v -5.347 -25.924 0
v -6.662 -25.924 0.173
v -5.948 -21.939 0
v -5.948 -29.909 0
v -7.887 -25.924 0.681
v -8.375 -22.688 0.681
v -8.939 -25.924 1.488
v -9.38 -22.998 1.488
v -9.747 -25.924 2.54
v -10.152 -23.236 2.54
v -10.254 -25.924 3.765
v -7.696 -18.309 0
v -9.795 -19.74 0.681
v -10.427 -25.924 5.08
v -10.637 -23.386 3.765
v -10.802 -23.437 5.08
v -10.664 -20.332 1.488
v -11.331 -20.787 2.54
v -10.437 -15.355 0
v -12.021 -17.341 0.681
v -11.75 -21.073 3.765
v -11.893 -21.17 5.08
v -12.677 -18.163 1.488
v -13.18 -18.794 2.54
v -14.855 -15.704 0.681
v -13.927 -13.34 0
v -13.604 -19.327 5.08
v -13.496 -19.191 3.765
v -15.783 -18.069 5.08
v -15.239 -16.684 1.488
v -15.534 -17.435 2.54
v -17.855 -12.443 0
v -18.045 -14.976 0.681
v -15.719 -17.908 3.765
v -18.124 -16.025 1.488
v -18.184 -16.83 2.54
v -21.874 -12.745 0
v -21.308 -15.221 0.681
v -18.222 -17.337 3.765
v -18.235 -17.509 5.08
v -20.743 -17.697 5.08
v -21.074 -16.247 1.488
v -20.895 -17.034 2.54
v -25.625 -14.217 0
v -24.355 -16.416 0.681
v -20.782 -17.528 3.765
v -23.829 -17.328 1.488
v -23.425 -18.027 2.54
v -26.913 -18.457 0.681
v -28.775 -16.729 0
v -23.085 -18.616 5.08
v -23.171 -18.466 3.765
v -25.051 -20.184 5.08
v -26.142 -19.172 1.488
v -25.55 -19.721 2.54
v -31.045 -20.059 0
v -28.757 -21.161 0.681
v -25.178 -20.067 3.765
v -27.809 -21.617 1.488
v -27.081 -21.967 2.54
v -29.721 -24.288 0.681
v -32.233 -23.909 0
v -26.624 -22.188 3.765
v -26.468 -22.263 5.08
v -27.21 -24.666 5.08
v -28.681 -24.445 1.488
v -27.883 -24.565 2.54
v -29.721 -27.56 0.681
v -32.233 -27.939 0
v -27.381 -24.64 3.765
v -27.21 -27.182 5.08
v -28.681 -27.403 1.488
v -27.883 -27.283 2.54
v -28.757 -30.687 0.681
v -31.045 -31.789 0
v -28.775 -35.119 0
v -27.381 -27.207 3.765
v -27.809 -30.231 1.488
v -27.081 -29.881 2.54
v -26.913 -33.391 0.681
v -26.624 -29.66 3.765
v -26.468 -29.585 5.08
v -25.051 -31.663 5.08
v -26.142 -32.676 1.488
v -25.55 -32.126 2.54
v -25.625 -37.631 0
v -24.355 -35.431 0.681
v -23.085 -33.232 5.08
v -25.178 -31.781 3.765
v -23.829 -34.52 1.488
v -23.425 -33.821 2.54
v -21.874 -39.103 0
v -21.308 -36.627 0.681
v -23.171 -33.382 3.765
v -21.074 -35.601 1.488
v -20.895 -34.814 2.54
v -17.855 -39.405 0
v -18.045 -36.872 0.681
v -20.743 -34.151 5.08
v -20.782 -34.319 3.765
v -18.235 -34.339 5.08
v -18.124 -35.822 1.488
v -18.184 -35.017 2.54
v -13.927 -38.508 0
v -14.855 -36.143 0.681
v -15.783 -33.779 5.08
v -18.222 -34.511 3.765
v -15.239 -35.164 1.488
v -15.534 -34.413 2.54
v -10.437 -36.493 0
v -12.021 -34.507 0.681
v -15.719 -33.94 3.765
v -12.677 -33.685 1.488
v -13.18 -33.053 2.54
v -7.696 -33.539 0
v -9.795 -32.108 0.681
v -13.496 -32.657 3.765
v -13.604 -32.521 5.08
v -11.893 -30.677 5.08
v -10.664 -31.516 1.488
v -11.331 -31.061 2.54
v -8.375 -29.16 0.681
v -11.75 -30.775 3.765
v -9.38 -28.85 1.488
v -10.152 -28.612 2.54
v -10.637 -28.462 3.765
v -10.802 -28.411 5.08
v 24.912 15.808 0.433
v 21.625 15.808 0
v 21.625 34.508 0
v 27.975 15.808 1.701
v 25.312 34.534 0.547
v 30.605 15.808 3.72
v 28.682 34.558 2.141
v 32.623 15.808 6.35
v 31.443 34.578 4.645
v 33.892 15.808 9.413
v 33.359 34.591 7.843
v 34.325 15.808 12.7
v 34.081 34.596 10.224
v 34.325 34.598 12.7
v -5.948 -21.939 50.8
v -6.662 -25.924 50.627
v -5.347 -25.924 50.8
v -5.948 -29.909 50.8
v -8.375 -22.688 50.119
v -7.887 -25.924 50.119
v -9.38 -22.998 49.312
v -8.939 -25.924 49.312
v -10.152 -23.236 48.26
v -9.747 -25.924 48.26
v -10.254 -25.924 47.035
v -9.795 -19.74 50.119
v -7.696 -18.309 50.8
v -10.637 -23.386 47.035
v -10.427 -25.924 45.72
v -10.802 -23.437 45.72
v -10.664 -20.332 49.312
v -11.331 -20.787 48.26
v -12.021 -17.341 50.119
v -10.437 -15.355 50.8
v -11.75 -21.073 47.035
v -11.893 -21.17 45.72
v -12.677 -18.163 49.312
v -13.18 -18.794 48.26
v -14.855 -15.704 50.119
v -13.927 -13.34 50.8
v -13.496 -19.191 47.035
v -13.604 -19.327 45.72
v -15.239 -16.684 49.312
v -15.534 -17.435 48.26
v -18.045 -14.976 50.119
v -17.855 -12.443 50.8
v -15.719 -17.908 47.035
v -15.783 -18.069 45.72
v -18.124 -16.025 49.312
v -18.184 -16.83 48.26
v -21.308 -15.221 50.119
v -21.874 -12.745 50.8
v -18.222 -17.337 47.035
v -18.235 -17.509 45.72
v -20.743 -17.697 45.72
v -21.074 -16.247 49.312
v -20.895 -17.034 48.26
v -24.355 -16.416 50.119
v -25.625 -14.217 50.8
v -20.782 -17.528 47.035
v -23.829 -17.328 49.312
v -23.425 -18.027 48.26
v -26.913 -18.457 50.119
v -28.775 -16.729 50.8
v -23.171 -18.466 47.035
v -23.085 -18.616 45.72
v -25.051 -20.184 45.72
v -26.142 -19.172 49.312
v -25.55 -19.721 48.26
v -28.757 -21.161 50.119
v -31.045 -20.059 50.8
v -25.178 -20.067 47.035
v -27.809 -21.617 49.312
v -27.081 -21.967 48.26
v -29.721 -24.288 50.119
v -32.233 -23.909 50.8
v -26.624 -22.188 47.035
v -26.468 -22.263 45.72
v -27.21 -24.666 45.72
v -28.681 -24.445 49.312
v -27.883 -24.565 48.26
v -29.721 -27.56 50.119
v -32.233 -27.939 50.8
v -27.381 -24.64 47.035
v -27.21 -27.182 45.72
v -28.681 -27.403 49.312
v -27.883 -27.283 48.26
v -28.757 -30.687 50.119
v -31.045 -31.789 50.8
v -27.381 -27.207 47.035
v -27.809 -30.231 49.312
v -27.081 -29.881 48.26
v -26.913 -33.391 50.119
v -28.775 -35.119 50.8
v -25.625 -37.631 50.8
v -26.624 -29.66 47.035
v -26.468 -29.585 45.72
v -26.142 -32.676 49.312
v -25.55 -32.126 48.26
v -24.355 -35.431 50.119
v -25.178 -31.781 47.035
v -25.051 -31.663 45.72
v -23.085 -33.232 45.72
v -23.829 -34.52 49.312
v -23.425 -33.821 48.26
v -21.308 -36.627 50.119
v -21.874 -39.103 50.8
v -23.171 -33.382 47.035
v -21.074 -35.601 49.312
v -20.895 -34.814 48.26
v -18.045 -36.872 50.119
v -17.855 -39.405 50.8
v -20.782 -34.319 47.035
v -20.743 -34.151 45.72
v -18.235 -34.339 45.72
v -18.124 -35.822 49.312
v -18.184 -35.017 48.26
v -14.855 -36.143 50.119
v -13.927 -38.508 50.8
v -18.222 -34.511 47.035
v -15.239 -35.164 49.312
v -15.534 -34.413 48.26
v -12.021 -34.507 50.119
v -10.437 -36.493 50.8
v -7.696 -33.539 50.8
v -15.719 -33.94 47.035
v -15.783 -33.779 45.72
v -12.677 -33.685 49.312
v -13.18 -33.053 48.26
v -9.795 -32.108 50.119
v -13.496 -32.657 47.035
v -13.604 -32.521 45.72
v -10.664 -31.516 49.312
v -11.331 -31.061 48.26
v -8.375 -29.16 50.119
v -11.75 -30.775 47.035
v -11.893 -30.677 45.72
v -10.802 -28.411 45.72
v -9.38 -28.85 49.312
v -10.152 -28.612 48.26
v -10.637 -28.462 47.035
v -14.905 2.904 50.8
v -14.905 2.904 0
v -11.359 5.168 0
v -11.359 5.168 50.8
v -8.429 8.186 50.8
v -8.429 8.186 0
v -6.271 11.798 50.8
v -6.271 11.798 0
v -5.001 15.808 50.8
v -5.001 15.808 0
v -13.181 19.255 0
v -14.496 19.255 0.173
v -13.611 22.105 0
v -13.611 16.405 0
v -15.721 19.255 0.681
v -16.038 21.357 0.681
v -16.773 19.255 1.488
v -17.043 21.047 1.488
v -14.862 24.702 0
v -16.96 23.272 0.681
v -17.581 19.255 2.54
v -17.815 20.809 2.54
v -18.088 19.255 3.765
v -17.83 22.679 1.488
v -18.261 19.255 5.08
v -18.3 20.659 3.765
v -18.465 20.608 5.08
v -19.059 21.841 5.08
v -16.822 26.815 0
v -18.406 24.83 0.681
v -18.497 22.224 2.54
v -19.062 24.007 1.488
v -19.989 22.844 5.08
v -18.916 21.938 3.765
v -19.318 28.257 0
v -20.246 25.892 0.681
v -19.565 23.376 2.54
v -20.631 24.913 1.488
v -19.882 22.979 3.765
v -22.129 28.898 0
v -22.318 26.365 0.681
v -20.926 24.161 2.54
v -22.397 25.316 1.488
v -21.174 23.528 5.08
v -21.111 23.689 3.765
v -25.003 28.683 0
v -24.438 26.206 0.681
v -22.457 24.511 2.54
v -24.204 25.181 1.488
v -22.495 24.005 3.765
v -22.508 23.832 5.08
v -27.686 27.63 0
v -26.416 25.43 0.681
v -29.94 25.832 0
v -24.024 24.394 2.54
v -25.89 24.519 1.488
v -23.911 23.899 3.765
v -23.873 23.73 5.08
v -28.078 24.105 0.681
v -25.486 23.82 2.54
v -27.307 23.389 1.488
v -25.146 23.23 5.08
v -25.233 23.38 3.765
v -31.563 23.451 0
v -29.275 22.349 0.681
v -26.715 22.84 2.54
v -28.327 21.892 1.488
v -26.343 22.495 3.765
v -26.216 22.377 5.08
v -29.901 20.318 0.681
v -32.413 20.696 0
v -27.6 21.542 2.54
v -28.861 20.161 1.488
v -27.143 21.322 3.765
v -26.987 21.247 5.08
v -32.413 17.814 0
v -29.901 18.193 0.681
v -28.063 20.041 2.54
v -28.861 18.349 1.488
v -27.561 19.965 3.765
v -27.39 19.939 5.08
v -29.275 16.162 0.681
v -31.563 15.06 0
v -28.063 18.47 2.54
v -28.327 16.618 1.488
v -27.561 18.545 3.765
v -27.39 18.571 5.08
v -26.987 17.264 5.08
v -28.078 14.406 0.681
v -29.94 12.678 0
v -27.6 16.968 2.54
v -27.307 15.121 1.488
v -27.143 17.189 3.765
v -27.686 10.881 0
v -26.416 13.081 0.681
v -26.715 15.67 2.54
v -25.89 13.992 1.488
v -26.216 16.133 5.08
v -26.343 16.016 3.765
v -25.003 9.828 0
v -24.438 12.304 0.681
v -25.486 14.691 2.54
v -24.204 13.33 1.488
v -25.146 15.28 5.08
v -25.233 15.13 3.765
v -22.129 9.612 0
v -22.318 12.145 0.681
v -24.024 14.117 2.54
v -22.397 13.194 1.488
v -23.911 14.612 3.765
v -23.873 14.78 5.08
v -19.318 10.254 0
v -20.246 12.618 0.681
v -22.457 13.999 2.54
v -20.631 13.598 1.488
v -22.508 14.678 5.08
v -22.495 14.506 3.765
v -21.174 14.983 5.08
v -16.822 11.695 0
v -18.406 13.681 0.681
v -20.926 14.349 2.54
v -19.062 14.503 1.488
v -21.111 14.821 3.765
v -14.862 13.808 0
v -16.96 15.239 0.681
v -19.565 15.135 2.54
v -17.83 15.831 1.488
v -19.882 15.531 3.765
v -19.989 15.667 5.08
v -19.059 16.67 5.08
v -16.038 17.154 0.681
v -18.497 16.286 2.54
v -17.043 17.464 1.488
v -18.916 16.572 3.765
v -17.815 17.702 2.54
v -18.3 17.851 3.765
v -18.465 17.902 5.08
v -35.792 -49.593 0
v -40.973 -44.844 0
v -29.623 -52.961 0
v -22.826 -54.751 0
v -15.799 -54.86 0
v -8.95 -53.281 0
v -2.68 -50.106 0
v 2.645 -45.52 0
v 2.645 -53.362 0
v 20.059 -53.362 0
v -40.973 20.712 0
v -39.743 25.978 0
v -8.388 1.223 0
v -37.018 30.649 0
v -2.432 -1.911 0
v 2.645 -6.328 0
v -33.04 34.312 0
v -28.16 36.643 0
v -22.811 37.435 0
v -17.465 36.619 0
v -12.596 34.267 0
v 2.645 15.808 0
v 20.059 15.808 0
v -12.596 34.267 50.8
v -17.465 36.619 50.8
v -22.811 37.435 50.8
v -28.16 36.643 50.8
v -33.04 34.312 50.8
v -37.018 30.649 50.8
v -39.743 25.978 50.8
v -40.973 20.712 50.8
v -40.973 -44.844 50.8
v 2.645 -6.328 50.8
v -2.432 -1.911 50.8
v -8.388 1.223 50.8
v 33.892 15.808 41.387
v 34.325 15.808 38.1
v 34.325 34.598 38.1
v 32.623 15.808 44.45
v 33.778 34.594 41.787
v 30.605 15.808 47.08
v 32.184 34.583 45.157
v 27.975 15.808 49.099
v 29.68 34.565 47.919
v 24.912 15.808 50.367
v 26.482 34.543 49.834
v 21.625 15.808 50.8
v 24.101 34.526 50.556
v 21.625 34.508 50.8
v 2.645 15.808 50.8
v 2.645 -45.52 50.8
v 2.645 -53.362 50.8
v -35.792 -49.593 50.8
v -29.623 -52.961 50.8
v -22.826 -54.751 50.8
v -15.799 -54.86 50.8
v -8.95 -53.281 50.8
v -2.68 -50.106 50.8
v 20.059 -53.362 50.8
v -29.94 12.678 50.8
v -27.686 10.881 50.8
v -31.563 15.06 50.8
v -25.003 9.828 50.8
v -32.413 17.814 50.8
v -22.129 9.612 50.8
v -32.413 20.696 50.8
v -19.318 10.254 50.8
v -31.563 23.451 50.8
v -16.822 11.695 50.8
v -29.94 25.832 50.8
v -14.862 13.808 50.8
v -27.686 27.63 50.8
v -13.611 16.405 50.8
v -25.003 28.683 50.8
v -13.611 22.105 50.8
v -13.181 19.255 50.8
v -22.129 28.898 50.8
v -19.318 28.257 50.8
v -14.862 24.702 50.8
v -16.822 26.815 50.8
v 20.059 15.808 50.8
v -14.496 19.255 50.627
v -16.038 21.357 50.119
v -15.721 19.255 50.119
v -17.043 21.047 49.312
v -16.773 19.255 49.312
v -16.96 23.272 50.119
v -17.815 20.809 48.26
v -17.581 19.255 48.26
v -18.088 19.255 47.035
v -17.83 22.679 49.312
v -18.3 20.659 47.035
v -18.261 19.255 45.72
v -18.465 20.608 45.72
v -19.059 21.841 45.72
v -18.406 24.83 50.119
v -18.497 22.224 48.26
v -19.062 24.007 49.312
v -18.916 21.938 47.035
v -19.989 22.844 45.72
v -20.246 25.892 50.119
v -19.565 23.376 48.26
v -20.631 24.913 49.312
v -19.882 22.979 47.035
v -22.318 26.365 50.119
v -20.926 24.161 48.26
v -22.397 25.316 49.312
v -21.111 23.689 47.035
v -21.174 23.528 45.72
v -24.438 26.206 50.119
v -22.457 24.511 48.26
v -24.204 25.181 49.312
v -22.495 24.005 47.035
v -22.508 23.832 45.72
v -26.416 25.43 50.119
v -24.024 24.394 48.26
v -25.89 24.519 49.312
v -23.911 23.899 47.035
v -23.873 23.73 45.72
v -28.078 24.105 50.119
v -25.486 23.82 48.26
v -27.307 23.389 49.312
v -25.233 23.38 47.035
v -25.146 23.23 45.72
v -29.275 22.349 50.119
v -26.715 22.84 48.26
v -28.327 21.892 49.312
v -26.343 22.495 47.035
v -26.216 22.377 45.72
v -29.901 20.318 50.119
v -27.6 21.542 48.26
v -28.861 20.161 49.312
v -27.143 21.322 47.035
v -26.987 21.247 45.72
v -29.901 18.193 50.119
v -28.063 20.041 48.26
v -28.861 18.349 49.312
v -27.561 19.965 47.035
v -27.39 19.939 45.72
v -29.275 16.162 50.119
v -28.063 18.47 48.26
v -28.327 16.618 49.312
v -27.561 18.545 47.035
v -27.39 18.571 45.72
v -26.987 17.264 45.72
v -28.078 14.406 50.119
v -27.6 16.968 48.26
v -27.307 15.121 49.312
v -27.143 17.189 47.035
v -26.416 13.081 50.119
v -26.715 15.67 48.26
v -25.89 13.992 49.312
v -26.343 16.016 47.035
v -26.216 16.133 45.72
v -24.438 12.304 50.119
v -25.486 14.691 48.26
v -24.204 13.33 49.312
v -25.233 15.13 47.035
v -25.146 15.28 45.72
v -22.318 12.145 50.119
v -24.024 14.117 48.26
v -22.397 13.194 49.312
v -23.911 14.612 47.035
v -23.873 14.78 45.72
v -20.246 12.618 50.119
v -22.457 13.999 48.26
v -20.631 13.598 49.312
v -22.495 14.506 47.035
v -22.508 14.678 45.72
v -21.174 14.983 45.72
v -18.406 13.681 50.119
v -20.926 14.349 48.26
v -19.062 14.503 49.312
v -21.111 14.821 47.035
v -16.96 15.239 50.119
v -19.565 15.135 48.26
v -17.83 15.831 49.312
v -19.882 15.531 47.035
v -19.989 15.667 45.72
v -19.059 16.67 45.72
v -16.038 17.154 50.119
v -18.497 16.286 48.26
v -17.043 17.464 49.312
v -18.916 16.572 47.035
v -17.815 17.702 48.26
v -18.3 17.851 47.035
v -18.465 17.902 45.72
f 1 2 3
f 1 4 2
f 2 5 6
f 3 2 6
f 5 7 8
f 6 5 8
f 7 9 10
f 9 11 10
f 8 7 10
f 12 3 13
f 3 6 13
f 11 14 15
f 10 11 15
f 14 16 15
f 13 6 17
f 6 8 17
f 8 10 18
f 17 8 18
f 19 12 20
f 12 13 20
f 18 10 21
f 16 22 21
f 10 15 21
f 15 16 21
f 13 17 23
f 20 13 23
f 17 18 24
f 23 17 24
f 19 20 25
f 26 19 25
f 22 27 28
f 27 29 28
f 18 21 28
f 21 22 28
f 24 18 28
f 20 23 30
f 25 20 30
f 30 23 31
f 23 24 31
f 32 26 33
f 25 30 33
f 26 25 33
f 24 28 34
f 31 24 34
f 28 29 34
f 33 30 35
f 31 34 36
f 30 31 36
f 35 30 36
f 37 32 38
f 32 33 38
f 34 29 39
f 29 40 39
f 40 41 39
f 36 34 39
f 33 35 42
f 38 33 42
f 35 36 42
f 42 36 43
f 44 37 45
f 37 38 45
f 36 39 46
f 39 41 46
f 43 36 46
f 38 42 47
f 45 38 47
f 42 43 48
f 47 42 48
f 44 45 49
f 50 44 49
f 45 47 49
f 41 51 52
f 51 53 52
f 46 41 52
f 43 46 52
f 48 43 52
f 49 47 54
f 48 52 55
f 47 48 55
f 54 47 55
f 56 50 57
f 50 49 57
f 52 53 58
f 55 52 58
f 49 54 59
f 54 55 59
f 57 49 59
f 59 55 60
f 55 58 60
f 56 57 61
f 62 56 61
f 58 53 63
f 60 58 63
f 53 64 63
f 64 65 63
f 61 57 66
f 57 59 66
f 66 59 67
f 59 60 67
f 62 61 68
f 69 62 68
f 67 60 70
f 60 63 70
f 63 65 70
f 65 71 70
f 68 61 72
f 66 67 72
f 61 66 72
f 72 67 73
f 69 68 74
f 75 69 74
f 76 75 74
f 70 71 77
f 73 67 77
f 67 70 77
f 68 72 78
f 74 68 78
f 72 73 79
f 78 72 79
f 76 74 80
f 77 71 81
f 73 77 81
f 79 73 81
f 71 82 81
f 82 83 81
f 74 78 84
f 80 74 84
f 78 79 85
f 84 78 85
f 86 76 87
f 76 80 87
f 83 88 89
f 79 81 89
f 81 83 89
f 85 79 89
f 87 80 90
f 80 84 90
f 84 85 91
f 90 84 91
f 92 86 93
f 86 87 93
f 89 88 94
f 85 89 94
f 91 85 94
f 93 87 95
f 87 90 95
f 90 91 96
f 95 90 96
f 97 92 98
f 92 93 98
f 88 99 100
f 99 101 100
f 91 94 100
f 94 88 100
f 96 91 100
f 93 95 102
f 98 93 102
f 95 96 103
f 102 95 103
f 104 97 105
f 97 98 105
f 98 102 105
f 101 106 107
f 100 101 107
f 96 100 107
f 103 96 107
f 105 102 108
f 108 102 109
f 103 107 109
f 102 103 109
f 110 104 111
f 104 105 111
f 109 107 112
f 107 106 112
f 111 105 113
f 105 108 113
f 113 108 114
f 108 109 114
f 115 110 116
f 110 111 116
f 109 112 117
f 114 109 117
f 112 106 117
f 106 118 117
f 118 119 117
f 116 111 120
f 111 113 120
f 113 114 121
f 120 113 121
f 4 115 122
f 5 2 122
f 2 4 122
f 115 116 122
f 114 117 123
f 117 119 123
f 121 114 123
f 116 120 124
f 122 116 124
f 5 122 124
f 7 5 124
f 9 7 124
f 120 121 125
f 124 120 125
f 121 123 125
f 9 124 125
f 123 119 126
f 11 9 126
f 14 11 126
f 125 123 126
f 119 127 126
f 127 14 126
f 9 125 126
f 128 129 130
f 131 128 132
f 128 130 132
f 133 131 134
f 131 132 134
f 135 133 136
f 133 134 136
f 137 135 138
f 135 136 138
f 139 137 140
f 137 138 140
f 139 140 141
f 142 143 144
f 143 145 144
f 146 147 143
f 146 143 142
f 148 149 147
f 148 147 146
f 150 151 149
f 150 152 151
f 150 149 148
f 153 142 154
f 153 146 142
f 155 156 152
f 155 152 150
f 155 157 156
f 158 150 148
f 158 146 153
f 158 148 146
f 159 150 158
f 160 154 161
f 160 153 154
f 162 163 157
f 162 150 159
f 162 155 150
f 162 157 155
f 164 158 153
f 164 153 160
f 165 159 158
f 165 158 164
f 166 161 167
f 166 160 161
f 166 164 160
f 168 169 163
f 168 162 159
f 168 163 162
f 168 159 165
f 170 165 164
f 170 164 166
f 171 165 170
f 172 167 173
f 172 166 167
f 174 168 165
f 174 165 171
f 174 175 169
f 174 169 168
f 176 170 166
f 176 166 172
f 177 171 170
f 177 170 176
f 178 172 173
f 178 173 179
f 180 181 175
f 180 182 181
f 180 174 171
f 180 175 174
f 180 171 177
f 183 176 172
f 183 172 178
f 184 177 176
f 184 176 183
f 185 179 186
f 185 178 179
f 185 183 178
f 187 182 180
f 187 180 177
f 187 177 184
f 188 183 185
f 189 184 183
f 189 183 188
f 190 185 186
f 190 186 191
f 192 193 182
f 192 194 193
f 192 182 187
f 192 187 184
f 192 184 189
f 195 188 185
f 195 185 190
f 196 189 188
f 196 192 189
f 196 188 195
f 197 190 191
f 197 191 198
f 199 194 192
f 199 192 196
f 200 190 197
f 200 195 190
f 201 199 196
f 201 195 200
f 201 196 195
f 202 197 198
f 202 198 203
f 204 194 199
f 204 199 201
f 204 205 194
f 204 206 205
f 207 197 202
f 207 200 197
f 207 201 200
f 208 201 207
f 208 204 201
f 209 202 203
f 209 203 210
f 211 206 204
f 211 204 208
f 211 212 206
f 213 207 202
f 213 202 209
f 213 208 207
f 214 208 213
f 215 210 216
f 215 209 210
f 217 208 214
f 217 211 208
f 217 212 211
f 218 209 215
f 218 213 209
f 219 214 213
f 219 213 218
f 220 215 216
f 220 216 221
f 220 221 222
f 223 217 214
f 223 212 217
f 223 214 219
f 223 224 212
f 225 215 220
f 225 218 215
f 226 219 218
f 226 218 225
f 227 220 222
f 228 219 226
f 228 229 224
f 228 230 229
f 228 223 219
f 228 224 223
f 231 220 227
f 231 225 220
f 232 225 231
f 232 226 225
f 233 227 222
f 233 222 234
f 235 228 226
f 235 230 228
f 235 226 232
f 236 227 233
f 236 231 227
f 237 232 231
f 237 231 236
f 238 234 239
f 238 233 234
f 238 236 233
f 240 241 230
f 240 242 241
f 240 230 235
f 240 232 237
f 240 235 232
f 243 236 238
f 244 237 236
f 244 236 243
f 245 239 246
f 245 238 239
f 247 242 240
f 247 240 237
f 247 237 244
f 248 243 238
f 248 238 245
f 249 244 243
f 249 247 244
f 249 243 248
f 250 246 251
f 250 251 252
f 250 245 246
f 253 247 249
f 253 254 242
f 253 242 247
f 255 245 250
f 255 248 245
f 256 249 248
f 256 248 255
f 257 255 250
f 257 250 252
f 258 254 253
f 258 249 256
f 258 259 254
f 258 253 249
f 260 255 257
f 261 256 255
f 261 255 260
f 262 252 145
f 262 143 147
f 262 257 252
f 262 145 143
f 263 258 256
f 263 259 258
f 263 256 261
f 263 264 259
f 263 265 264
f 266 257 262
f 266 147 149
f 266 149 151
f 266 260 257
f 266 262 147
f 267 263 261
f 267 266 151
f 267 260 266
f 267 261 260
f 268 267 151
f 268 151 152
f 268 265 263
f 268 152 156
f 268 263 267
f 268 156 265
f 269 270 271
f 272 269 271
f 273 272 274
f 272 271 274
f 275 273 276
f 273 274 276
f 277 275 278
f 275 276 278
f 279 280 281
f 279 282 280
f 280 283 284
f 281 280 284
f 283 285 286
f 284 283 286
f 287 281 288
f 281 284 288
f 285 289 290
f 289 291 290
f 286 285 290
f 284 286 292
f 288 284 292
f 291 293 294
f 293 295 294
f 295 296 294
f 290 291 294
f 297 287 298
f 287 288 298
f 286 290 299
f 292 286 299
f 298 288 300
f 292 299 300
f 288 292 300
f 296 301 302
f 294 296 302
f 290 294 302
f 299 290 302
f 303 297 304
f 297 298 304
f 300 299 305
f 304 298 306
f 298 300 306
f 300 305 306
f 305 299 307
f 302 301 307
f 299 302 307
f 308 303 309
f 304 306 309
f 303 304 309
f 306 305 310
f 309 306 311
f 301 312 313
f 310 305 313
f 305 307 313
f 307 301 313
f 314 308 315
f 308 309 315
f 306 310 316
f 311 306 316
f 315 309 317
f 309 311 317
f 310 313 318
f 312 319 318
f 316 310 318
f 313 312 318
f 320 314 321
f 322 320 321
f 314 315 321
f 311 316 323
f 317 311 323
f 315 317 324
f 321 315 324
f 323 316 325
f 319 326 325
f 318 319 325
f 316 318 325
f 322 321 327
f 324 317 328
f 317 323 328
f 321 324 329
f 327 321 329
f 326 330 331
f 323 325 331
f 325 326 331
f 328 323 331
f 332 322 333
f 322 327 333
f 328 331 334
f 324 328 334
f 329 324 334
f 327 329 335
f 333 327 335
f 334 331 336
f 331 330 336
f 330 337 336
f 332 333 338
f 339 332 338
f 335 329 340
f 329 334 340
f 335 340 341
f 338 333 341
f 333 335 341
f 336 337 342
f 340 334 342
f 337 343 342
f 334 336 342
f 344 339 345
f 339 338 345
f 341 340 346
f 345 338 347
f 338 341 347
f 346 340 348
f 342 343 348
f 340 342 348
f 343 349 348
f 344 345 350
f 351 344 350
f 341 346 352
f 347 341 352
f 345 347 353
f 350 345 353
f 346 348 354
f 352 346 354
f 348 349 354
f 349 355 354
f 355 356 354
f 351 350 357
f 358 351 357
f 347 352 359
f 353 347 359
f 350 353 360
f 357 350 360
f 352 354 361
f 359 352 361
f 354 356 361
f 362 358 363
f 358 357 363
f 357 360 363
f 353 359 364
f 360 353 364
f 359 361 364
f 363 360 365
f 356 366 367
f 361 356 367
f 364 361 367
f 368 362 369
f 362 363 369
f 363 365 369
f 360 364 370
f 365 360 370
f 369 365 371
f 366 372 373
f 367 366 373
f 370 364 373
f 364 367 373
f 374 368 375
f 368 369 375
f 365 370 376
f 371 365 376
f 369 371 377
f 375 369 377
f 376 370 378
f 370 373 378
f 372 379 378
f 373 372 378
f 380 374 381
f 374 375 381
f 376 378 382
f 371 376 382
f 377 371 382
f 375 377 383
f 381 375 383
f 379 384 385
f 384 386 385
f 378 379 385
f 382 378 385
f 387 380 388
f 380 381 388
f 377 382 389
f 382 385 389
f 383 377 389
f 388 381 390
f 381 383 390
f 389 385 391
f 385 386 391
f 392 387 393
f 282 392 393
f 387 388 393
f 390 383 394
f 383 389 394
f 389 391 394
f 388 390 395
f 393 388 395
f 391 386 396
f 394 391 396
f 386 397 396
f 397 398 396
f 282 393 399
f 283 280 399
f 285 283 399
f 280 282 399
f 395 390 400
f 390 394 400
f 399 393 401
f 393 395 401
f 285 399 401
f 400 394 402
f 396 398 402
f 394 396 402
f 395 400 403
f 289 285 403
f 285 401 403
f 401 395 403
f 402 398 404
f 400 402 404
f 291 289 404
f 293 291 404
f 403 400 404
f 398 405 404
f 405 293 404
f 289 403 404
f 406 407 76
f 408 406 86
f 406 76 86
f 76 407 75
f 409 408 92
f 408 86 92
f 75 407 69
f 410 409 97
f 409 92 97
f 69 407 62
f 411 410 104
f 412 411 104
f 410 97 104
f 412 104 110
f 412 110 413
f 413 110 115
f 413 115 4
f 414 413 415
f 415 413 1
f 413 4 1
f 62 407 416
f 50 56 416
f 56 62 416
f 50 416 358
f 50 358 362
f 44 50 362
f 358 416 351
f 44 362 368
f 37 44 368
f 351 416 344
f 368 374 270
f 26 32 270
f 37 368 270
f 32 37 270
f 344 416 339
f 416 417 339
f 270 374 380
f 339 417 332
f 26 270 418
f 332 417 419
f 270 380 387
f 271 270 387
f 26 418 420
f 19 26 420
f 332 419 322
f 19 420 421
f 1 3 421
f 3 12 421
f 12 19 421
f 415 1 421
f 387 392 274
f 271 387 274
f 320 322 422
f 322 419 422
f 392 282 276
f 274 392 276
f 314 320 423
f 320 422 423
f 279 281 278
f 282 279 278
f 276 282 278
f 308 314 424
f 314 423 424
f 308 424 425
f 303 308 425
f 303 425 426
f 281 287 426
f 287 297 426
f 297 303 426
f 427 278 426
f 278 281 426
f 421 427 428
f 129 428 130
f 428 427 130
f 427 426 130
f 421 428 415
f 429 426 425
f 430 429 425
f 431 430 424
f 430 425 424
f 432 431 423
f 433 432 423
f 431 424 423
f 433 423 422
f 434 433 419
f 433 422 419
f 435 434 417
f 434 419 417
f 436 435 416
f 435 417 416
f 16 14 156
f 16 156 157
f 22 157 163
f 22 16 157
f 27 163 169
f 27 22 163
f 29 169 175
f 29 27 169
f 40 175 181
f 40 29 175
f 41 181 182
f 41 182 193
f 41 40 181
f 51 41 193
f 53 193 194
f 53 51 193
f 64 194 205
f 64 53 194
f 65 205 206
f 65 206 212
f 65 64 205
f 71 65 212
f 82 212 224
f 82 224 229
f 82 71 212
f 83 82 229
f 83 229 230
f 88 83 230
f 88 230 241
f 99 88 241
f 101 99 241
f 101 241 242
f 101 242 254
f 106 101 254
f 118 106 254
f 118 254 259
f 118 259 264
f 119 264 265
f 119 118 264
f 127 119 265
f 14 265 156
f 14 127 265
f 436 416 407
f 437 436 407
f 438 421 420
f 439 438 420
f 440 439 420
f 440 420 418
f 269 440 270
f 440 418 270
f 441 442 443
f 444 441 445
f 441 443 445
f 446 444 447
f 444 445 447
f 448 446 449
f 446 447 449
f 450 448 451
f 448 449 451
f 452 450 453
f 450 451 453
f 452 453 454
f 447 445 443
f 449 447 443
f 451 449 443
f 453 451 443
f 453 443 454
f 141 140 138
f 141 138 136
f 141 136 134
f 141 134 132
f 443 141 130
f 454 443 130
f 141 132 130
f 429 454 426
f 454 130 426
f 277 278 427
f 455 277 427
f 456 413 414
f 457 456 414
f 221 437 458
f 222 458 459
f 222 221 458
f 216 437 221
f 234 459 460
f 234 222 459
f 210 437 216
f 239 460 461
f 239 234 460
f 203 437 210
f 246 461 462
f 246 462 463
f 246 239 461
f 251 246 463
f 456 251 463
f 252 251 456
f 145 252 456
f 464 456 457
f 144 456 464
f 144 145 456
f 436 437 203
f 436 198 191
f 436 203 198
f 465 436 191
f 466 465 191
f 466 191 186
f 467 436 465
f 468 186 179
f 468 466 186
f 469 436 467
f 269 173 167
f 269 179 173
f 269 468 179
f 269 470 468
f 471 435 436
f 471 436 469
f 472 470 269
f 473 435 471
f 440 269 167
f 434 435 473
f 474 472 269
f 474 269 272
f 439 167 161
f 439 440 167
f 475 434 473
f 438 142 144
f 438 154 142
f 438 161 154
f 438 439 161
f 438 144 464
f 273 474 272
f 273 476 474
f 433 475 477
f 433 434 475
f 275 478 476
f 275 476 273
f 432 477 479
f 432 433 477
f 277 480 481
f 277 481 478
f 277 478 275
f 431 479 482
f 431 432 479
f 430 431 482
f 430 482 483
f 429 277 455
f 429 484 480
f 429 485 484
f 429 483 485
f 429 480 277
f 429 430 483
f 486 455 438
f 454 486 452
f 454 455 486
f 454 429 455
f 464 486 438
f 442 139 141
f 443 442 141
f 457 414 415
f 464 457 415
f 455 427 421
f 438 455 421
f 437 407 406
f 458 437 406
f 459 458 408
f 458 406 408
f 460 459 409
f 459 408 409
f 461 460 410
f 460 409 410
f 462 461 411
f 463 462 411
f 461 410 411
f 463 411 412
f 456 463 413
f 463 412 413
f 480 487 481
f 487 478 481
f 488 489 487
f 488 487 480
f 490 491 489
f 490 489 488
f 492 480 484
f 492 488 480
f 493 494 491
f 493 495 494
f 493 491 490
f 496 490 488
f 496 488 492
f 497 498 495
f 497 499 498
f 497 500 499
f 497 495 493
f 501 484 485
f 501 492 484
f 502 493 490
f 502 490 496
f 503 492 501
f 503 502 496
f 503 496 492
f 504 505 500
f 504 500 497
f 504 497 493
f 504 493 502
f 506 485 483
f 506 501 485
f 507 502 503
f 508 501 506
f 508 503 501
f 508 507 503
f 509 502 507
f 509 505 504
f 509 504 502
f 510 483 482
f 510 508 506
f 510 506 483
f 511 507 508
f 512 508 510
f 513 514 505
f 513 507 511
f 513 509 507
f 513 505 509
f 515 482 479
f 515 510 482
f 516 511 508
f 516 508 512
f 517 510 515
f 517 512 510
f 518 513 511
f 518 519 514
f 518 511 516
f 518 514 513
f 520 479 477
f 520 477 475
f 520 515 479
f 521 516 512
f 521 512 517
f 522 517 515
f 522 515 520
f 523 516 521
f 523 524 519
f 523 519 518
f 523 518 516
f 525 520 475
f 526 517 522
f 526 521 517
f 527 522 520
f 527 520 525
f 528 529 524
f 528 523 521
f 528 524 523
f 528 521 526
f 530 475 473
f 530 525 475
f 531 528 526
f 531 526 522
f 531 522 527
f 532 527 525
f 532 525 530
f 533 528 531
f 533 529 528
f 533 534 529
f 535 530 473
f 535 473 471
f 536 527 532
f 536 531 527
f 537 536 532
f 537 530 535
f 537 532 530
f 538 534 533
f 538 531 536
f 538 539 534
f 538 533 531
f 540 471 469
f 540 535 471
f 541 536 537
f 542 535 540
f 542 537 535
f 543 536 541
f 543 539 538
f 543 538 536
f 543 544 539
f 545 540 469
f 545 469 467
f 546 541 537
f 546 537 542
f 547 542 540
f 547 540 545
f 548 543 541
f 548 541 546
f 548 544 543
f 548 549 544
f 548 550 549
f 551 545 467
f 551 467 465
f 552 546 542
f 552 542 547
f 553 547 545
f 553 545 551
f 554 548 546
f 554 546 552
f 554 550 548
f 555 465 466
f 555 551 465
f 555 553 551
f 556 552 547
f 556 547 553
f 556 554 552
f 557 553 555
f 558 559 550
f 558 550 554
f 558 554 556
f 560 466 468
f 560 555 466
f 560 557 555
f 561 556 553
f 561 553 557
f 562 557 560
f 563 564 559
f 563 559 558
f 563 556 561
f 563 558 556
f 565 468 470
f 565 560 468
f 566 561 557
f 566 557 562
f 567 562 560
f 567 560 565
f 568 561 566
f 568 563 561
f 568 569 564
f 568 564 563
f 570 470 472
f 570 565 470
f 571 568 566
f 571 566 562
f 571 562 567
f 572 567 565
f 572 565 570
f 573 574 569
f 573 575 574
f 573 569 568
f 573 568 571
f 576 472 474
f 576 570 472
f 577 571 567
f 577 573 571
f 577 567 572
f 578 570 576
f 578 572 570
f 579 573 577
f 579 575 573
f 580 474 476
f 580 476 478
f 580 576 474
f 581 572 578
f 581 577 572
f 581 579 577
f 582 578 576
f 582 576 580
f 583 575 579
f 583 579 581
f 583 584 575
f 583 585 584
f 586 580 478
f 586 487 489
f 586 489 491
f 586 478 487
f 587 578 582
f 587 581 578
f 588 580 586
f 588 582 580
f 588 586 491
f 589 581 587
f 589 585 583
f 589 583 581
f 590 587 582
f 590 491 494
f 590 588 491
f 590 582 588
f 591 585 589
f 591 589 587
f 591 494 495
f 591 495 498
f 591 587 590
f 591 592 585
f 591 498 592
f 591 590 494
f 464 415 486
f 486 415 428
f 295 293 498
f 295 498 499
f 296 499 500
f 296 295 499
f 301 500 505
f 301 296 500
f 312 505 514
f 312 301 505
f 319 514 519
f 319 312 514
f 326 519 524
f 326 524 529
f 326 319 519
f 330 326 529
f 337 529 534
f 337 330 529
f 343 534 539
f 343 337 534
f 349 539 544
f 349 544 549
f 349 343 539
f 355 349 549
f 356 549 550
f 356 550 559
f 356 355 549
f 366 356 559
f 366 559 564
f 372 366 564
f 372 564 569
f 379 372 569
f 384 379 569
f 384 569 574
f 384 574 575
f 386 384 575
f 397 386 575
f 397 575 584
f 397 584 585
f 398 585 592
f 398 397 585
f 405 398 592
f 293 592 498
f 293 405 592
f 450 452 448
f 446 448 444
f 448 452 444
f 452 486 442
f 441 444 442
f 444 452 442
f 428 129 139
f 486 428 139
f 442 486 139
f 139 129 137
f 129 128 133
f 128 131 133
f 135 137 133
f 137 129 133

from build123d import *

# Parameters (mm, degrees)
F0_R     = 8.438361
F0_R_2   = 4.589875
F1_DEPTH = 50.8
F2_R     = 12.7
F3_R     = 5.08
F4_R     = 5.08
F5_R     = 12.7


with BuildPart() as f1:
    # F0 (on Top) → F1 (new body)
    with BuildSketch(Plane.XY):
        with BuildLine():
            ThreePointArc((-12.59586, 34.266691), (-30.68705, 35.659992), (-40.972862, 20.712266))
            Line((-40.972862, 20.712266), (-40.972862, -44.844314))
            ThreePointArc((-40.972862, -44.844314), (-19.315957, -55.018783), (2.645491, -45.519513))
            ThreePointArc((2.645491, -45.519513), (10.232743, -25.923947), (2.645491, -6.328381))
            ThreePointArc((2.645491, -6.328381), (-5.319089, -0.171182), (-14.90509, 2.903589))
            ThreePointArc((-14.90509, 2.903589), (-8.429057, 8.186436), (-5.000832, 15.808428))
            ThreePointArc((-5.000832, 15.808428), (-6.038721, 26.173063), (-12.59586, 34.266691))
        make_face()
        with Locations((-18.865578, -25.923947)):
            Circle(F0_R, mode=Mode.SUBTRACT)
        with Locations((-22.851223, 19.255218)):
            Circle(F0_R_2, mode=Mode.SUBTRACT)
        with BuildLine():
            Line((34.324799, 34.597994), (-12.59586, 34.266691))
            ThreePointArc((-12.59586, 34.266691), (-6.038721, 26.173063), (-5.000832, 15.808428))
            Line((-5.000832, 15.808428), (2.645491, 15.808428))
            Line((2.645491, 15.808428), (2.645491, -6.328381))
            ThreePointArc((2.645491, -6.328381), (10.232743, -25.923947), (2.645491, -45.519513))
            Line((2.645491, -45.519513), (2.645491, -53.361509))
            Line((2.645491, -53.361509), (20.059254, -53.361509))
            Line((20.059254, -53.361509), (20.059254, 15.808428))
            Line((20.059254, 15.808428), (34.324799, 15.808428))
            Line((34.324799, 15.808428), (34.324799, 34.597994))
        make_face()
    extrude(amount=F1_DEPTH)

    # F2
    f2_edges = [f1.edges().sort_by_distance(p)[0] for p in [
        (34.324799, 25.203211, 50.8),
    ]]
    fillet(f2_edges, radius=F2_R)

    # F3
    f3_edges = [f1.edges().sort_by_distance(p)[0] for p in [
        (-10.427217, -25.923947, 25.4),
        (-27.303939, -25.923947, 0),
        (-27.303939, -25.923947, 50.8),
        (-27.441098, 19.255218, 50.8),
    ]]
    fillet(f3_edges, radius=F3_R)

    # F4
    f4_edges = [f1.edges().sort_by_distance(p)[0] for p in [
        (-27.441098, 19.255218, 0),
    ]]
    fillet(f4_edges, radius=F4_R)

    # F5
    f5_edges = [f1.edges().sort_by_distance(p)[0] for p in [
        (34.324799, 25.203211, 0),
    ]]
    fillet(f5_edges, radius=F5_R)


solid = f1.part
